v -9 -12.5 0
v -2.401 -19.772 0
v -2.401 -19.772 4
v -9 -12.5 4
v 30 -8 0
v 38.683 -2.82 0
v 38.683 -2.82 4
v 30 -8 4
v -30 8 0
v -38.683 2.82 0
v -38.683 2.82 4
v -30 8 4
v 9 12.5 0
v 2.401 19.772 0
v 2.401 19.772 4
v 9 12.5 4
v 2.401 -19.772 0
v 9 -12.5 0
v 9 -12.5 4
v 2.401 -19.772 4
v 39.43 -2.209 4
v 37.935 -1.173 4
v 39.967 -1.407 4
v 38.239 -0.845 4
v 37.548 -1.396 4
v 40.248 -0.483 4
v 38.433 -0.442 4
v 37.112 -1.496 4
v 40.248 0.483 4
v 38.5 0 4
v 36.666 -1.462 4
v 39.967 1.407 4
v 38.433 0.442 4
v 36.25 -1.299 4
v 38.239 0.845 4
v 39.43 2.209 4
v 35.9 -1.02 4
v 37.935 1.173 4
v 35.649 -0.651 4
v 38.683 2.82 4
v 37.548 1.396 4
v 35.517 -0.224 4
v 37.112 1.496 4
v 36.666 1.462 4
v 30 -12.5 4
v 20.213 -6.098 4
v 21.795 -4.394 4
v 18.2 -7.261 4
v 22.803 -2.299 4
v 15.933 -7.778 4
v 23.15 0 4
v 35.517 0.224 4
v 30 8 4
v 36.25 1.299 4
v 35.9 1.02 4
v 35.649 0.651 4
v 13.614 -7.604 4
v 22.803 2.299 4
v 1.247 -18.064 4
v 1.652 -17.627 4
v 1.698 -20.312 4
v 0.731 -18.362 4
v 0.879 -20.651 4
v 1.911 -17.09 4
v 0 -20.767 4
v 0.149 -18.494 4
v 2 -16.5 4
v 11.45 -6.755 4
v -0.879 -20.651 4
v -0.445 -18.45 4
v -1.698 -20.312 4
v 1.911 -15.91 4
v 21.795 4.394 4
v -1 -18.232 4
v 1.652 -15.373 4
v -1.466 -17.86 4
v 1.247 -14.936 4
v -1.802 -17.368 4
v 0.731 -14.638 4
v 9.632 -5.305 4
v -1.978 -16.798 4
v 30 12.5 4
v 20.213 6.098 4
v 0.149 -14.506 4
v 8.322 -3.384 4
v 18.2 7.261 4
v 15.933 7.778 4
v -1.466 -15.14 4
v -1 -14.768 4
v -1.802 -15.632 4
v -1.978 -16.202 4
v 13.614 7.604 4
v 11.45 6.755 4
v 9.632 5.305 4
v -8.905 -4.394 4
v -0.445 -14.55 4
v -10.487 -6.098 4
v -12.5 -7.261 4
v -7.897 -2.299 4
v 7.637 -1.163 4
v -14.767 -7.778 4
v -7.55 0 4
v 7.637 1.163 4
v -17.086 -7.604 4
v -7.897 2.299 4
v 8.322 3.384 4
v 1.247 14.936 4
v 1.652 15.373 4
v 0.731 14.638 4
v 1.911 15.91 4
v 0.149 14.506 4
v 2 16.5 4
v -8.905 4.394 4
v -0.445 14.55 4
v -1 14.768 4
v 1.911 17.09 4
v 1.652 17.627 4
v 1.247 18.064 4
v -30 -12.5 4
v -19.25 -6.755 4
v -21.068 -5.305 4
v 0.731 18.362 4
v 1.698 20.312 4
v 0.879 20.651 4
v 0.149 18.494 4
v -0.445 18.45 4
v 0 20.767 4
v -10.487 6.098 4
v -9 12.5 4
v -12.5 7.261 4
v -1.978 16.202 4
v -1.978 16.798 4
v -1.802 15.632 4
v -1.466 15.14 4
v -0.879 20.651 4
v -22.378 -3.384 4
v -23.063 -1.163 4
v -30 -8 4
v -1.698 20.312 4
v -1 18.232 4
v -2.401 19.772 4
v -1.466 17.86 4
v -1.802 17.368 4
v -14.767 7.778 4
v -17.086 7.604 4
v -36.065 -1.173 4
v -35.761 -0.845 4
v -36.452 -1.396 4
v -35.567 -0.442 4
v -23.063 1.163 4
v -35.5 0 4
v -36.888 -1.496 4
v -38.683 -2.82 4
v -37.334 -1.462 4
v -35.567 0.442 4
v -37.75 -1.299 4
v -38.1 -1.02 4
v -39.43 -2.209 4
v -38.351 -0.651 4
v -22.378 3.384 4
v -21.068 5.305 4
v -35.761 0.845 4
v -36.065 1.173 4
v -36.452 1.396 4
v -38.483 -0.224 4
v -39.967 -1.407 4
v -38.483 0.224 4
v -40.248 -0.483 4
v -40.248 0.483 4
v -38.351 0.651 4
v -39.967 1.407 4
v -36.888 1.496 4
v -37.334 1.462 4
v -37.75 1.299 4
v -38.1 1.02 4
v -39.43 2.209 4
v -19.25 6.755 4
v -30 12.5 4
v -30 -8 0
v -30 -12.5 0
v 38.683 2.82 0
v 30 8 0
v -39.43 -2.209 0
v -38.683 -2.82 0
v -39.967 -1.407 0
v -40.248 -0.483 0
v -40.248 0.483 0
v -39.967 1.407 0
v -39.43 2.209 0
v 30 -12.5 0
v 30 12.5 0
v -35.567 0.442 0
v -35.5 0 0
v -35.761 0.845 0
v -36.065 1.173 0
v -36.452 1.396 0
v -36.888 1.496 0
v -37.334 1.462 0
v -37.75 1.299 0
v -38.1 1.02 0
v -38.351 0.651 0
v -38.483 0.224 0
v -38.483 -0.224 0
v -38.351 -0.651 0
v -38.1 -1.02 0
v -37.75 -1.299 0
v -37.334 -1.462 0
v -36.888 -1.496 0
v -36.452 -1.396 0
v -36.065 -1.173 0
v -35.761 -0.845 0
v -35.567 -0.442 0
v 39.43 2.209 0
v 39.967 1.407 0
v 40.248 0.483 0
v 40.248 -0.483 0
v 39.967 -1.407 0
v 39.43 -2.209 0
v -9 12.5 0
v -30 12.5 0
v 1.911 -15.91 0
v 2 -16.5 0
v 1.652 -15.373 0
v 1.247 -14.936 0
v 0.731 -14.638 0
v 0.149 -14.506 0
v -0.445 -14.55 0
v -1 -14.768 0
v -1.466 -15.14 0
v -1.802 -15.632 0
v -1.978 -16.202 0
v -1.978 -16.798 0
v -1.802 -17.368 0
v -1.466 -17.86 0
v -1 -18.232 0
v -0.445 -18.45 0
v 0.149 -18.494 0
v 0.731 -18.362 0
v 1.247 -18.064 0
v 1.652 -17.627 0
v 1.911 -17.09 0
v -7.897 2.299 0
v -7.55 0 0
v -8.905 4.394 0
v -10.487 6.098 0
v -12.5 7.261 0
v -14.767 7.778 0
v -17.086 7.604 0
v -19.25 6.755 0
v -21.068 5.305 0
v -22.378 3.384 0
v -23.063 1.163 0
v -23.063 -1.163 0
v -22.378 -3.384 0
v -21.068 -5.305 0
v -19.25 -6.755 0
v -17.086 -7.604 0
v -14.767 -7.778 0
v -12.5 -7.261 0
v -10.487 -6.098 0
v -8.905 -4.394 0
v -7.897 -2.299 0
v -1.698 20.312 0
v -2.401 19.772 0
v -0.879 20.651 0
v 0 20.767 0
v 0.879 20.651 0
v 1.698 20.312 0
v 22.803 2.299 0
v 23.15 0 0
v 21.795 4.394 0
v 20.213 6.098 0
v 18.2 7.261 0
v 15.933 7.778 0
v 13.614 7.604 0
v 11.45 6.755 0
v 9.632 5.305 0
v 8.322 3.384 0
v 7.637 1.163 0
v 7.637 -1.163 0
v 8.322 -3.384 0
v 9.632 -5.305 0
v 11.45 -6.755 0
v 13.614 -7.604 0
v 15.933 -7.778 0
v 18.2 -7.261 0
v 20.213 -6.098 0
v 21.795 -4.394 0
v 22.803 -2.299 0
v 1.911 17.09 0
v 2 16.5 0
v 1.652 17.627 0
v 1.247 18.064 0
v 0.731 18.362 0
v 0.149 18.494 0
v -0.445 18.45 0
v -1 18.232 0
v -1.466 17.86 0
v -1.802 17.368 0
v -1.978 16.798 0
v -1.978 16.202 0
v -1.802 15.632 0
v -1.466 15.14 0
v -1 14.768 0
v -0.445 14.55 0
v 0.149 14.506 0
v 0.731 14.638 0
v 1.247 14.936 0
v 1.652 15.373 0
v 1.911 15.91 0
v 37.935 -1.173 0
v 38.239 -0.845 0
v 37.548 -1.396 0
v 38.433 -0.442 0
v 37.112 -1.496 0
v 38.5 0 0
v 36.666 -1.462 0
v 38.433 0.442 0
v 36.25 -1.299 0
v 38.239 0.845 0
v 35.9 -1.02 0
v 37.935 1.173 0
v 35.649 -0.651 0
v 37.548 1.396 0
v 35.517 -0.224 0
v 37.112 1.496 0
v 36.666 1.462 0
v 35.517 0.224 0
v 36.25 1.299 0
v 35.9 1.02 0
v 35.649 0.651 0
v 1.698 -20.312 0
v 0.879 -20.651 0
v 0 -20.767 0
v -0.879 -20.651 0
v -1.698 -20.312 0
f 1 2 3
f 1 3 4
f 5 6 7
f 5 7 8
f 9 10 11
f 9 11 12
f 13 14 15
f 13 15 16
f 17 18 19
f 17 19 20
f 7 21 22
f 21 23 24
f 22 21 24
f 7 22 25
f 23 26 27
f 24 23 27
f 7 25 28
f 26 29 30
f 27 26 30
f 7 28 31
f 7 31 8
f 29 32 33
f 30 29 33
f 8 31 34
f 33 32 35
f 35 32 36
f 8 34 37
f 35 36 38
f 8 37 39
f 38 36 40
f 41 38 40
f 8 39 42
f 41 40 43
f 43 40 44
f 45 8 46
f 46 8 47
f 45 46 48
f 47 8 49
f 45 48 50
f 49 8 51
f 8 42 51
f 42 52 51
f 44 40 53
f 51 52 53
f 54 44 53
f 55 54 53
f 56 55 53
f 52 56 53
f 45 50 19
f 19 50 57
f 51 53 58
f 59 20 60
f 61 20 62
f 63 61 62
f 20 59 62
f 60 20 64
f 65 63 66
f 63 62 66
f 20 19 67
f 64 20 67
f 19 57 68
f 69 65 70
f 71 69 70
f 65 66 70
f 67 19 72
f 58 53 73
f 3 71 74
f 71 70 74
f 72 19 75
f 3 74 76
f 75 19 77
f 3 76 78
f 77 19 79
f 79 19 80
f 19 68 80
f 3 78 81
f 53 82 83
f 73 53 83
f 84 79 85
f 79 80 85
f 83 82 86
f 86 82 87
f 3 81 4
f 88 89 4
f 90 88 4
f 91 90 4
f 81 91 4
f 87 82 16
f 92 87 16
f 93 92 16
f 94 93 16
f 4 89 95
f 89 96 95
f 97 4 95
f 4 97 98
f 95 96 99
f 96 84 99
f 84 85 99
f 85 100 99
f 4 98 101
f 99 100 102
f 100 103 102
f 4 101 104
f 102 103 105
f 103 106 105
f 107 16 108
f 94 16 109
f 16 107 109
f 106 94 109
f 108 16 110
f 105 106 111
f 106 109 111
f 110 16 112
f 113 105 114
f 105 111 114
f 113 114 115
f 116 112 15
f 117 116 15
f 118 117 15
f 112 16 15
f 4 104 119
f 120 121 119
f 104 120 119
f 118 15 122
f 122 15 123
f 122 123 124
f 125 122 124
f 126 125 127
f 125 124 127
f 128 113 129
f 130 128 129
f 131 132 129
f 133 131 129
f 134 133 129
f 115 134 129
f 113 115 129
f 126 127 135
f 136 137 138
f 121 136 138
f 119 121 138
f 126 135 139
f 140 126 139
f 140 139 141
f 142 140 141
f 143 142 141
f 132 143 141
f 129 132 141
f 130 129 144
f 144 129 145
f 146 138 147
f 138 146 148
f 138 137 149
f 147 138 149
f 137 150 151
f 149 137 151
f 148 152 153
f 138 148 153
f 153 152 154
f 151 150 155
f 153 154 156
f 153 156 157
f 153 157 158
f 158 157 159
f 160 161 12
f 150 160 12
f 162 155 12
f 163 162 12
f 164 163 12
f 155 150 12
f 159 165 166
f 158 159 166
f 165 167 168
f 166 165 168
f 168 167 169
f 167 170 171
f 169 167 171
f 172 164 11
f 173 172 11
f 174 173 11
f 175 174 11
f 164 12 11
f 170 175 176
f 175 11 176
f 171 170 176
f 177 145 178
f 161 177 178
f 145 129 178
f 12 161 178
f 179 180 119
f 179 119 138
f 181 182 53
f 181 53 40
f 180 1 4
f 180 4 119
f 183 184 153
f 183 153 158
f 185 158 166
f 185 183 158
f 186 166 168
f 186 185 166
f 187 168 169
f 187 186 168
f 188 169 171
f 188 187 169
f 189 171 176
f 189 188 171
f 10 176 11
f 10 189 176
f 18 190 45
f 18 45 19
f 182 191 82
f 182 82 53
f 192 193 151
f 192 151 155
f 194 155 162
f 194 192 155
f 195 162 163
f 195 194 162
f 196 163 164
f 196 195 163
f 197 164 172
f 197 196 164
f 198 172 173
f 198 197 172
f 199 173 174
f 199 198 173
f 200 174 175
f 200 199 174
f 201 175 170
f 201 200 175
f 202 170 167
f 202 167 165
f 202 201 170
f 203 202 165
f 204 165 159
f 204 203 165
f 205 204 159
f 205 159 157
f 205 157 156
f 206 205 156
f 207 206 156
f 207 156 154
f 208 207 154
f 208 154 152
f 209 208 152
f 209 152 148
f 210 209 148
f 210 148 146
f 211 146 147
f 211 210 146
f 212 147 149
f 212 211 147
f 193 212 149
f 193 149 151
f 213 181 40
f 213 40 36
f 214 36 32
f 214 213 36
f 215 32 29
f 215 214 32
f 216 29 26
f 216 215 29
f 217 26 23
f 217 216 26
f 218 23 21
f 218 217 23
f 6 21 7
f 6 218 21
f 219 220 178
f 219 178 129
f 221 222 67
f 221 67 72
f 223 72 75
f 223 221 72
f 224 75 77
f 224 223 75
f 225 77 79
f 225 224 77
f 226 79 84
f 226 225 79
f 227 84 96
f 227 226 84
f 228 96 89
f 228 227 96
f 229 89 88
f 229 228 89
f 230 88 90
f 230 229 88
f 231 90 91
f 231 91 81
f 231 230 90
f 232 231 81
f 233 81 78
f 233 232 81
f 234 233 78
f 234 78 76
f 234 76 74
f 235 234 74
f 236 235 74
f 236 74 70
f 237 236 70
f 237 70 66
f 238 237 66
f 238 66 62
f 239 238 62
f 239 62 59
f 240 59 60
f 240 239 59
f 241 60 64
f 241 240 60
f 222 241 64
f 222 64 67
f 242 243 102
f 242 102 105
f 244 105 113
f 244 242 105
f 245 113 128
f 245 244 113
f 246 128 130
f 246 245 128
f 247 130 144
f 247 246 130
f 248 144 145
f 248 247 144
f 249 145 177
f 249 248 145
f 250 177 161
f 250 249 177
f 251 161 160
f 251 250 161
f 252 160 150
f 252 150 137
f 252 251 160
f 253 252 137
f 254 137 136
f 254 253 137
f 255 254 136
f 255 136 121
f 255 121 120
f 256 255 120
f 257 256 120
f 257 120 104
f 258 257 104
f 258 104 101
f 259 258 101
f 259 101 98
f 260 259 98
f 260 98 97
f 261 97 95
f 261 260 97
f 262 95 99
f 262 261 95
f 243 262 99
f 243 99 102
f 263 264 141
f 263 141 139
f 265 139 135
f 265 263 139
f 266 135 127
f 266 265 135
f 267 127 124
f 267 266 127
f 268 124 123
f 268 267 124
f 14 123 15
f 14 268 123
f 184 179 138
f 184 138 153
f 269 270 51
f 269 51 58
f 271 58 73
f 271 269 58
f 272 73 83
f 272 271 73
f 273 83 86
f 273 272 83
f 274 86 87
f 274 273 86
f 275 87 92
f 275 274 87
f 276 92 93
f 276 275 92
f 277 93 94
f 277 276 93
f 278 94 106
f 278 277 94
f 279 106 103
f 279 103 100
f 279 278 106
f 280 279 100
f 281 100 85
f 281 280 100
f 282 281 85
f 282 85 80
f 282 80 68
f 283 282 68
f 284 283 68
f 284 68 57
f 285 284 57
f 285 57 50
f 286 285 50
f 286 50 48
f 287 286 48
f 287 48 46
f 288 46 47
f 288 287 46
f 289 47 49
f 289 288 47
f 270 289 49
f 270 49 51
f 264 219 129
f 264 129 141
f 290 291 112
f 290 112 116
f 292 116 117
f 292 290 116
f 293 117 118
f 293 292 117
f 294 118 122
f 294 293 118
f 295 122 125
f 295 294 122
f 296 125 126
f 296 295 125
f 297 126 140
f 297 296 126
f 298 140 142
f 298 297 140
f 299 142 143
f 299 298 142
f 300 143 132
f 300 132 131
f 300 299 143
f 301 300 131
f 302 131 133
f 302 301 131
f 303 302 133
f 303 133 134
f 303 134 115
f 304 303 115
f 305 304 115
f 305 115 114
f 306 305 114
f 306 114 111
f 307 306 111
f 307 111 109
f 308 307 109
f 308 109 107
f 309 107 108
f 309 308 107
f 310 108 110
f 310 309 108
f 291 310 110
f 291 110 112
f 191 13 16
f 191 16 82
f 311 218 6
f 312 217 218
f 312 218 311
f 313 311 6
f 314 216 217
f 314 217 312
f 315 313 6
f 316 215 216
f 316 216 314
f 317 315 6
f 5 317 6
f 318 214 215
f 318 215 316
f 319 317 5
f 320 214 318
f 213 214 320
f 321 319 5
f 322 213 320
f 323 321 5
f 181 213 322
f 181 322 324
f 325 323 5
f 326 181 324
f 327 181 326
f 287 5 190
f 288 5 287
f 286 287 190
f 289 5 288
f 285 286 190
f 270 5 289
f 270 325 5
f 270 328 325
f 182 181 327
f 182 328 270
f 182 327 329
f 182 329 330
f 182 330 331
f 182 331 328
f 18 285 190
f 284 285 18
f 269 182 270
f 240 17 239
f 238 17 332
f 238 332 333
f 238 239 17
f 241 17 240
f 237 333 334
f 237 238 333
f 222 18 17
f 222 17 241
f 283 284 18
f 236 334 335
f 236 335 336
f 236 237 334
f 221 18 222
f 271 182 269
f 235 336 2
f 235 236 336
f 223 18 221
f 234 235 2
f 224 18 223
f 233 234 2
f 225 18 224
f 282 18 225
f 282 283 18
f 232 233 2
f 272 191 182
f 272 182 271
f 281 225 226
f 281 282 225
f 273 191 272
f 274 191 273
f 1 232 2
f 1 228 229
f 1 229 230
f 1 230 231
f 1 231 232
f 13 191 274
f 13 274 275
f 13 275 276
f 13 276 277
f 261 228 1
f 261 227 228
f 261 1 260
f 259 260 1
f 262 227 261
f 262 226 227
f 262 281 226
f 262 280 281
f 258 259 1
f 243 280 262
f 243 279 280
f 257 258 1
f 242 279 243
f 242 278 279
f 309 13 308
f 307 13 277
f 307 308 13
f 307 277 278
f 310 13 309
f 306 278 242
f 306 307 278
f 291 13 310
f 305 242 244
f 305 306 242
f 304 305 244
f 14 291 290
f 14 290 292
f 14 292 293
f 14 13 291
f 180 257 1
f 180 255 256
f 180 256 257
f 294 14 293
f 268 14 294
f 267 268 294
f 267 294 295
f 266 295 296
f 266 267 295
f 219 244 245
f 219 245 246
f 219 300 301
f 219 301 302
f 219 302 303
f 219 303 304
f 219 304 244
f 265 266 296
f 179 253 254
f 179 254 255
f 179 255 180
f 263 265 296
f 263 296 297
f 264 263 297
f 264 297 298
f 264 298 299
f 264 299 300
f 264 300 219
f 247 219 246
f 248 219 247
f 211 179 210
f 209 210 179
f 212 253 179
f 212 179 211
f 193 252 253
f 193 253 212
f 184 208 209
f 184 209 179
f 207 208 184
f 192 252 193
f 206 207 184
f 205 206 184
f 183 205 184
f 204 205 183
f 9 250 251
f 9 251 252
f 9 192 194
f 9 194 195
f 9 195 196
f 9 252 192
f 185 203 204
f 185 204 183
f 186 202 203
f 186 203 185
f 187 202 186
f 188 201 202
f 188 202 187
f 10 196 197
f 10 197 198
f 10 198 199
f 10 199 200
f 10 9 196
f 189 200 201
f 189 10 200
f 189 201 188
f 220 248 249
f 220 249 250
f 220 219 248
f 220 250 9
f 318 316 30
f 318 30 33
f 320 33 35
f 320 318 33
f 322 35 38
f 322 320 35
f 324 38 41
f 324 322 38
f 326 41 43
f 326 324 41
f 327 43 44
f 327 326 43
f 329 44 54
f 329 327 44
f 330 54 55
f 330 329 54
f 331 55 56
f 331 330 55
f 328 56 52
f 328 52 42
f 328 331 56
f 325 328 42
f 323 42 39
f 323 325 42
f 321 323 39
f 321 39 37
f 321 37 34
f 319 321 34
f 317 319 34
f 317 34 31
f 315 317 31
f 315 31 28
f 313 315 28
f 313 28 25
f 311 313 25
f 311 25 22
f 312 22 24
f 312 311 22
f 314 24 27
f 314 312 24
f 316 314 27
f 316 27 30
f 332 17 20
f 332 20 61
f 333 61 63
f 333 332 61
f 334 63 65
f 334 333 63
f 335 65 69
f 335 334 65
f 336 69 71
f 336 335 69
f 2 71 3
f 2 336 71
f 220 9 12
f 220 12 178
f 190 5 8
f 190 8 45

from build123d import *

# Parameters (mm, degrees)
SKETCH1_R           = 7.8
SKETCH1_R_2         = 2
SKETCH1_R_3         = 1.5
BOSS_EXTRUDE1_DEPTH = 4


with BuildPart() as part:
    # Sketch1 → Boss-Extrude1 (new body)
    with BuildSketch(Plane.XY):
        with BuildLine():
            Line((-9, 12.5), (-2.401010284, 19.772380391))
            ThreePointArc((-2.401010284, 19.772380391), (0, 20.766911414), (2.401010284, 19.772380391))
            Line((2.401010284, 19.772380391), (9, 12.5))
            Line((9, 12.5), (30, 12.5))
            Line((30, 12.5), (30, 8))
            Line((30, 8), (38.682501327, 2.820305125))
            ThreePointArc((38.682501327, 2.820305125), (40.284041978, 0), (38.682501327, -2.820305125))
            Line((38.682501327, -2.820305125), (30, -8))
            Line((30, -8), (30, -12.5))
            Line((30, -12.5), (9, -12.5))
            Line((9, -12.5), (2.401010284, -19.772380391))
            ThreePointArc((2.401010284, -19.772380391), (0, -20.766911414), (-2.401010284, -19.772380391))
            Line((-2.401010284, -19.772380391), (-9, -12.5))
            Line((-9, -12.5), (-30, -12.5))
            Line((-30, -12.5), (-30, -8))
            Line((-30, -8), (-38.682501327, -2.820305125))
            ThreePointArc((-38.682501327, -2.820305125), (-40.284041978, 0), (-38.682501327, 2.820305125))
            Line((-38.682501327, 2.820305125), (-30, 8))
            Line((-30, 8), (-30, 12.5))
            Line((-30, 12.5), (-9, 12.5))
        make_face()
        with Locations((-15.35, 0)):
            Circle(SKETCH1_R, mode=Mode.SUBTRACT)
        with Locations((15.35, 0)):
            Circle(SKETCH1_R, mode=Mode.SUBTRACT)
        with Locations((0, 16.5)):
            Circle(SKETCH1_R_2, mode=Mode.SUBTRACT)
        with Locations((0, -16.5)):
            Circle(SKETCH1_R_2, mode=Mode.SUBTRACT)
        with Locations((-37, 0)):
            Circle(SKETCH1_R_3, mode=Mode.SUBTRACT)
        with Locations((37, 0)):
            Circle(SKETCH1_R_3, mode=Mode.SUBTRACT)
    extrude(amount=BOSS_EXTRUDE1_DEPTH)


solid = part.part
